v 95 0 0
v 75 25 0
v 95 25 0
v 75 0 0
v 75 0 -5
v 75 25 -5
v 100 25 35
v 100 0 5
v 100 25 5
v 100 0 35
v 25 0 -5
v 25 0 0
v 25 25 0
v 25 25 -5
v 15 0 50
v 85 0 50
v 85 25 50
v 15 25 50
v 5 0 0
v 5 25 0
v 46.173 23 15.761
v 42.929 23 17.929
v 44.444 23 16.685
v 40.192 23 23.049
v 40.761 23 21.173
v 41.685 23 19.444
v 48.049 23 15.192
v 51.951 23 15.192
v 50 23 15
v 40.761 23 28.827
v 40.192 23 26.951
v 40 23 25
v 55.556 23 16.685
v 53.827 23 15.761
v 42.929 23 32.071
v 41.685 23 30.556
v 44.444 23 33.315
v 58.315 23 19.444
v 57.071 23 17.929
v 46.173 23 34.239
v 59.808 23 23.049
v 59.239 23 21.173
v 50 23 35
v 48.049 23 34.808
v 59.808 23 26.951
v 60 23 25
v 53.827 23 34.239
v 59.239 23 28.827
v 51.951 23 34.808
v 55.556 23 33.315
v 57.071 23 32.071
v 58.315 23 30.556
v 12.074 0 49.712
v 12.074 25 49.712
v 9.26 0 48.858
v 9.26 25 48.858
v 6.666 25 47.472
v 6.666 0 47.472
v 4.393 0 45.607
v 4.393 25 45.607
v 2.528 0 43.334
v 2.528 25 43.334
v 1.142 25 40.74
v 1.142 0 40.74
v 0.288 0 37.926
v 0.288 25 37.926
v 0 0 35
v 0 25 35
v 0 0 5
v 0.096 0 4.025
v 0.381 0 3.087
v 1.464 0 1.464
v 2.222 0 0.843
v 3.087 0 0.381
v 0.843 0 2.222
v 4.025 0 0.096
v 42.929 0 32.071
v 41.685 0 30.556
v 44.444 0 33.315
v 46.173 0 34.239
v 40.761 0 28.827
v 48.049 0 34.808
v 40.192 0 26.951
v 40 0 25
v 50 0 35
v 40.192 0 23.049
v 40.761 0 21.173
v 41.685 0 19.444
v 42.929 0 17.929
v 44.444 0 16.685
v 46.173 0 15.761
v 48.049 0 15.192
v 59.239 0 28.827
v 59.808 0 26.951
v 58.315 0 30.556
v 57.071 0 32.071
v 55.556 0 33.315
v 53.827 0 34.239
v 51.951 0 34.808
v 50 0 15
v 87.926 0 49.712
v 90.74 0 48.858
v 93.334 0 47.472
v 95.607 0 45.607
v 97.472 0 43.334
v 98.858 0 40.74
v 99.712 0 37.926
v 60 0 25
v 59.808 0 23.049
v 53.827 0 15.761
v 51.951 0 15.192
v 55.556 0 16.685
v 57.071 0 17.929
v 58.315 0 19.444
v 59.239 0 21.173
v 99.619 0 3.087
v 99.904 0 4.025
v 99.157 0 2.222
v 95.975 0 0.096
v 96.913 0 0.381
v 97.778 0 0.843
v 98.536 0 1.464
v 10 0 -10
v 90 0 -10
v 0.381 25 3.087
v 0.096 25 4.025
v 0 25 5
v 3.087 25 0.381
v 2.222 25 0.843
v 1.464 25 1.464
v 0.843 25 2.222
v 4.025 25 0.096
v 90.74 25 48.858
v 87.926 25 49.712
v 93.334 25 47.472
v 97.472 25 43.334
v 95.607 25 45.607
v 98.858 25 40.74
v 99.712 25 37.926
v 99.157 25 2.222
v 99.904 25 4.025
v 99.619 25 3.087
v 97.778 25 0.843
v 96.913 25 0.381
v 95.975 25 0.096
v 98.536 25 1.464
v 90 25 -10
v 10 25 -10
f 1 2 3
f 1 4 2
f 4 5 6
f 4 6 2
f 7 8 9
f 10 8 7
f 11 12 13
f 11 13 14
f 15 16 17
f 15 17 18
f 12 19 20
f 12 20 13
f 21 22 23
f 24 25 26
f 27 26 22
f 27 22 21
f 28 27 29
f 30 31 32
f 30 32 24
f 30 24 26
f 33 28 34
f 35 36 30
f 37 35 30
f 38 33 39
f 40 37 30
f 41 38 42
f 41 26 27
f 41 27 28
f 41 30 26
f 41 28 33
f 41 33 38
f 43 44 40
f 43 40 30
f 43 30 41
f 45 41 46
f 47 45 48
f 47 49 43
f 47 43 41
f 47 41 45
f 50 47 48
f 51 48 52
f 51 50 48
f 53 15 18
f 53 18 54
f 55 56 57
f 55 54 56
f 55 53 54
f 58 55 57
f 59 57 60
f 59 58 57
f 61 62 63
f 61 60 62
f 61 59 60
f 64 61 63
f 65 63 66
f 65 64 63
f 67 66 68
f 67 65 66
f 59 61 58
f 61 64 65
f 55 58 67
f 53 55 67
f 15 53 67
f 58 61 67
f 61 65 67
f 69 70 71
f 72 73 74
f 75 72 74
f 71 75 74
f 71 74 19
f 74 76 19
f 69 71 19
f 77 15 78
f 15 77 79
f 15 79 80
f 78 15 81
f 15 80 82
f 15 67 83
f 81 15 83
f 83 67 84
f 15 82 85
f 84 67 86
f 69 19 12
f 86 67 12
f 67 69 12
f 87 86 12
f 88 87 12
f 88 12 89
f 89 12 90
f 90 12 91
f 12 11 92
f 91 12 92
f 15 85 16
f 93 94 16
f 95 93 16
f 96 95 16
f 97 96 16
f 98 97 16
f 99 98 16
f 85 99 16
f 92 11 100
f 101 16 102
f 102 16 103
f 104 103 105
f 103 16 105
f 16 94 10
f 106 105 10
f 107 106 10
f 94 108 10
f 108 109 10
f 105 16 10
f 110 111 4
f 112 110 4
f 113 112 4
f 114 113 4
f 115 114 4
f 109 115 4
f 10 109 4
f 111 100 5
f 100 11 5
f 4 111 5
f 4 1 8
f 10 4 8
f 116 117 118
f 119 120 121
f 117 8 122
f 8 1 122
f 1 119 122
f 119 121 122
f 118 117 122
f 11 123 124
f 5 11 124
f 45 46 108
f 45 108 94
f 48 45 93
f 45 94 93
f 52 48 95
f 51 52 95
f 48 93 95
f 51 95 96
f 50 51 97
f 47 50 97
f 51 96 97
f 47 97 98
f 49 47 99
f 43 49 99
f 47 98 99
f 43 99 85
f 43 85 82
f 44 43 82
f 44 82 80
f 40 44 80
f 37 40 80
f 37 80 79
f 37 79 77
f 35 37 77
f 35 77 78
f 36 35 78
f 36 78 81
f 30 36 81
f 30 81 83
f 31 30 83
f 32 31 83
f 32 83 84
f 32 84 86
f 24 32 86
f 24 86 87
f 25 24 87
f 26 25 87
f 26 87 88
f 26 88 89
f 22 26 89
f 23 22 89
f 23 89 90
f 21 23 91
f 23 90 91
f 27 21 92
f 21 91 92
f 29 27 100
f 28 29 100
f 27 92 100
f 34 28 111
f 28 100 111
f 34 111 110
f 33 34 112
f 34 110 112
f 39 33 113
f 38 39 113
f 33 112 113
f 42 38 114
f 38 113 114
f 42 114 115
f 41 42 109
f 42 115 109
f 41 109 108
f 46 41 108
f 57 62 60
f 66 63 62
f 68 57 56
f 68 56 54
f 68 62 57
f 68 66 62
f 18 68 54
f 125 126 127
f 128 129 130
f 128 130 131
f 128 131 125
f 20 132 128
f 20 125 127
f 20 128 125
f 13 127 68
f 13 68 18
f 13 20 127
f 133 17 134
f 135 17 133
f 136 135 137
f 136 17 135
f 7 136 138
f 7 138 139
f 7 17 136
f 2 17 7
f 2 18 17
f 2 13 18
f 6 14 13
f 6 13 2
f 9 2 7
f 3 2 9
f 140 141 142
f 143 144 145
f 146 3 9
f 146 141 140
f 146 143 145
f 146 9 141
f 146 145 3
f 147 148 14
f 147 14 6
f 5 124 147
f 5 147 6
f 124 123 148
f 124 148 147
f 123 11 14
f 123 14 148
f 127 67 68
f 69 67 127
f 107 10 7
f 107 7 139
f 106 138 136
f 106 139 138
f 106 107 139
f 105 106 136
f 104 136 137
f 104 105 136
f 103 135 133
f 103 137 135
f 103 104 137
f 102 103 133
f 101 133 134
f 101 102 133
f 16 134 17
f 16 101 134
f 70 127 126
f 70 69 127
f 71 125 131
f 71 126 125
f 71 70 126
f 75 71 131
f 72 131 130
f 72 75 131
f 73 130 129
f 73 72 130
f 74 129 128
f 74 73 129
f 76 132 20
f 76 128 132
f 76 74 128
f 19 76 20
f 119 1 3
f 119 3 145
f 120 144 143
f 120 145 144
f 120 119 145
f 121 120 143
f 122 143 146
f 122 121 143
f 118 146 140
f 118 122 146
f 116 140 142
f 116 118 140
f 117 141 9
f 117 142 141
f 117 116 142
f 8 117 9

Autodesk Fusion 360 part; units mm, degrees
sketch "Sketch1" plane through (0, 0, 0) normal (0, 1, 0) x (1, 0, 0)
  line L0 (5, 0) -> (95, 0)
  line L1 (100, -5) -> (100, -35)
  line L2 (85, -50) -> (15, -50)
  line L3 (0, -35) -> (0, -5)
  arc A0 (0, -35) -> (15, -50) centre (15, -35) ccw
  arc A1 (85, -50) -> (100, -35) centre (85, -35) ccw
  arc A2 (5, 0) -> (0, -5) centre (5, -5) ccw
  arc A3 (100, -5) -> (95, 0) centre (95, -5) ccw
  point P0 (100, 0)
  point P1 (0, -50)
  dimension "d1" = 100
  dimension "d2" = 50
  dimension "d3" = 15
  dimension "d4" = 5
extrude "Extrude1" add sketch "Sketch1" along normal blind 25
shell "Shell1" thickness 3 removed faces 1 at (61.6667, 8.3333, 50)
sketch "Sketch2" plane through (0, 0, 0) normal (0, -1, 0) x (1, 0, 0)
  arc A0 (100, 35) -> (85, 50) centre (85, 35) ccw
  line L0 (85, 50) -> (15, 50)
  arc A1 (15, 50) -> (0, 35) centre (15, 35) ccw
  line L1 (0, 35) -> (0, 5)
  arc A2 (0, 5) -> (5, 0) centre (5, 5) ccw
  line L2 (5, 0) -> (95, 0)
  arc A3 (95, 0) -> (100, 5) centre (95, 5) ccw
  line L3 (100, 5) -> (100, 35)
  line L4 (25, 0) -> (25, -5)
  line L5 (25, -5) -> (10, -10)
  line L6 (10, -10) -> (90, -10)
  line L7 (90, -10) -> (75, -5)
  line L8 (75, -5) -> (75, 0)
  circle A4 centre (50, 25) radius 10
  dimension "d8" = 5
  dimension "d9" = 5
  dimension "d10" = 50
  dimension "d11" = 80
  dimension "d12" = 10
  dimension "d13" = 20
  dimension "d14" = 50
  dimension "d15" = 25
extrude "Extrude2" cut sketch "Sketch2" against normal blind 23 contours A4
extrude "Extrude3" add sketch "Sketch2" against normal blind 25 contours L2 L4 L5 L6 L7 L8
